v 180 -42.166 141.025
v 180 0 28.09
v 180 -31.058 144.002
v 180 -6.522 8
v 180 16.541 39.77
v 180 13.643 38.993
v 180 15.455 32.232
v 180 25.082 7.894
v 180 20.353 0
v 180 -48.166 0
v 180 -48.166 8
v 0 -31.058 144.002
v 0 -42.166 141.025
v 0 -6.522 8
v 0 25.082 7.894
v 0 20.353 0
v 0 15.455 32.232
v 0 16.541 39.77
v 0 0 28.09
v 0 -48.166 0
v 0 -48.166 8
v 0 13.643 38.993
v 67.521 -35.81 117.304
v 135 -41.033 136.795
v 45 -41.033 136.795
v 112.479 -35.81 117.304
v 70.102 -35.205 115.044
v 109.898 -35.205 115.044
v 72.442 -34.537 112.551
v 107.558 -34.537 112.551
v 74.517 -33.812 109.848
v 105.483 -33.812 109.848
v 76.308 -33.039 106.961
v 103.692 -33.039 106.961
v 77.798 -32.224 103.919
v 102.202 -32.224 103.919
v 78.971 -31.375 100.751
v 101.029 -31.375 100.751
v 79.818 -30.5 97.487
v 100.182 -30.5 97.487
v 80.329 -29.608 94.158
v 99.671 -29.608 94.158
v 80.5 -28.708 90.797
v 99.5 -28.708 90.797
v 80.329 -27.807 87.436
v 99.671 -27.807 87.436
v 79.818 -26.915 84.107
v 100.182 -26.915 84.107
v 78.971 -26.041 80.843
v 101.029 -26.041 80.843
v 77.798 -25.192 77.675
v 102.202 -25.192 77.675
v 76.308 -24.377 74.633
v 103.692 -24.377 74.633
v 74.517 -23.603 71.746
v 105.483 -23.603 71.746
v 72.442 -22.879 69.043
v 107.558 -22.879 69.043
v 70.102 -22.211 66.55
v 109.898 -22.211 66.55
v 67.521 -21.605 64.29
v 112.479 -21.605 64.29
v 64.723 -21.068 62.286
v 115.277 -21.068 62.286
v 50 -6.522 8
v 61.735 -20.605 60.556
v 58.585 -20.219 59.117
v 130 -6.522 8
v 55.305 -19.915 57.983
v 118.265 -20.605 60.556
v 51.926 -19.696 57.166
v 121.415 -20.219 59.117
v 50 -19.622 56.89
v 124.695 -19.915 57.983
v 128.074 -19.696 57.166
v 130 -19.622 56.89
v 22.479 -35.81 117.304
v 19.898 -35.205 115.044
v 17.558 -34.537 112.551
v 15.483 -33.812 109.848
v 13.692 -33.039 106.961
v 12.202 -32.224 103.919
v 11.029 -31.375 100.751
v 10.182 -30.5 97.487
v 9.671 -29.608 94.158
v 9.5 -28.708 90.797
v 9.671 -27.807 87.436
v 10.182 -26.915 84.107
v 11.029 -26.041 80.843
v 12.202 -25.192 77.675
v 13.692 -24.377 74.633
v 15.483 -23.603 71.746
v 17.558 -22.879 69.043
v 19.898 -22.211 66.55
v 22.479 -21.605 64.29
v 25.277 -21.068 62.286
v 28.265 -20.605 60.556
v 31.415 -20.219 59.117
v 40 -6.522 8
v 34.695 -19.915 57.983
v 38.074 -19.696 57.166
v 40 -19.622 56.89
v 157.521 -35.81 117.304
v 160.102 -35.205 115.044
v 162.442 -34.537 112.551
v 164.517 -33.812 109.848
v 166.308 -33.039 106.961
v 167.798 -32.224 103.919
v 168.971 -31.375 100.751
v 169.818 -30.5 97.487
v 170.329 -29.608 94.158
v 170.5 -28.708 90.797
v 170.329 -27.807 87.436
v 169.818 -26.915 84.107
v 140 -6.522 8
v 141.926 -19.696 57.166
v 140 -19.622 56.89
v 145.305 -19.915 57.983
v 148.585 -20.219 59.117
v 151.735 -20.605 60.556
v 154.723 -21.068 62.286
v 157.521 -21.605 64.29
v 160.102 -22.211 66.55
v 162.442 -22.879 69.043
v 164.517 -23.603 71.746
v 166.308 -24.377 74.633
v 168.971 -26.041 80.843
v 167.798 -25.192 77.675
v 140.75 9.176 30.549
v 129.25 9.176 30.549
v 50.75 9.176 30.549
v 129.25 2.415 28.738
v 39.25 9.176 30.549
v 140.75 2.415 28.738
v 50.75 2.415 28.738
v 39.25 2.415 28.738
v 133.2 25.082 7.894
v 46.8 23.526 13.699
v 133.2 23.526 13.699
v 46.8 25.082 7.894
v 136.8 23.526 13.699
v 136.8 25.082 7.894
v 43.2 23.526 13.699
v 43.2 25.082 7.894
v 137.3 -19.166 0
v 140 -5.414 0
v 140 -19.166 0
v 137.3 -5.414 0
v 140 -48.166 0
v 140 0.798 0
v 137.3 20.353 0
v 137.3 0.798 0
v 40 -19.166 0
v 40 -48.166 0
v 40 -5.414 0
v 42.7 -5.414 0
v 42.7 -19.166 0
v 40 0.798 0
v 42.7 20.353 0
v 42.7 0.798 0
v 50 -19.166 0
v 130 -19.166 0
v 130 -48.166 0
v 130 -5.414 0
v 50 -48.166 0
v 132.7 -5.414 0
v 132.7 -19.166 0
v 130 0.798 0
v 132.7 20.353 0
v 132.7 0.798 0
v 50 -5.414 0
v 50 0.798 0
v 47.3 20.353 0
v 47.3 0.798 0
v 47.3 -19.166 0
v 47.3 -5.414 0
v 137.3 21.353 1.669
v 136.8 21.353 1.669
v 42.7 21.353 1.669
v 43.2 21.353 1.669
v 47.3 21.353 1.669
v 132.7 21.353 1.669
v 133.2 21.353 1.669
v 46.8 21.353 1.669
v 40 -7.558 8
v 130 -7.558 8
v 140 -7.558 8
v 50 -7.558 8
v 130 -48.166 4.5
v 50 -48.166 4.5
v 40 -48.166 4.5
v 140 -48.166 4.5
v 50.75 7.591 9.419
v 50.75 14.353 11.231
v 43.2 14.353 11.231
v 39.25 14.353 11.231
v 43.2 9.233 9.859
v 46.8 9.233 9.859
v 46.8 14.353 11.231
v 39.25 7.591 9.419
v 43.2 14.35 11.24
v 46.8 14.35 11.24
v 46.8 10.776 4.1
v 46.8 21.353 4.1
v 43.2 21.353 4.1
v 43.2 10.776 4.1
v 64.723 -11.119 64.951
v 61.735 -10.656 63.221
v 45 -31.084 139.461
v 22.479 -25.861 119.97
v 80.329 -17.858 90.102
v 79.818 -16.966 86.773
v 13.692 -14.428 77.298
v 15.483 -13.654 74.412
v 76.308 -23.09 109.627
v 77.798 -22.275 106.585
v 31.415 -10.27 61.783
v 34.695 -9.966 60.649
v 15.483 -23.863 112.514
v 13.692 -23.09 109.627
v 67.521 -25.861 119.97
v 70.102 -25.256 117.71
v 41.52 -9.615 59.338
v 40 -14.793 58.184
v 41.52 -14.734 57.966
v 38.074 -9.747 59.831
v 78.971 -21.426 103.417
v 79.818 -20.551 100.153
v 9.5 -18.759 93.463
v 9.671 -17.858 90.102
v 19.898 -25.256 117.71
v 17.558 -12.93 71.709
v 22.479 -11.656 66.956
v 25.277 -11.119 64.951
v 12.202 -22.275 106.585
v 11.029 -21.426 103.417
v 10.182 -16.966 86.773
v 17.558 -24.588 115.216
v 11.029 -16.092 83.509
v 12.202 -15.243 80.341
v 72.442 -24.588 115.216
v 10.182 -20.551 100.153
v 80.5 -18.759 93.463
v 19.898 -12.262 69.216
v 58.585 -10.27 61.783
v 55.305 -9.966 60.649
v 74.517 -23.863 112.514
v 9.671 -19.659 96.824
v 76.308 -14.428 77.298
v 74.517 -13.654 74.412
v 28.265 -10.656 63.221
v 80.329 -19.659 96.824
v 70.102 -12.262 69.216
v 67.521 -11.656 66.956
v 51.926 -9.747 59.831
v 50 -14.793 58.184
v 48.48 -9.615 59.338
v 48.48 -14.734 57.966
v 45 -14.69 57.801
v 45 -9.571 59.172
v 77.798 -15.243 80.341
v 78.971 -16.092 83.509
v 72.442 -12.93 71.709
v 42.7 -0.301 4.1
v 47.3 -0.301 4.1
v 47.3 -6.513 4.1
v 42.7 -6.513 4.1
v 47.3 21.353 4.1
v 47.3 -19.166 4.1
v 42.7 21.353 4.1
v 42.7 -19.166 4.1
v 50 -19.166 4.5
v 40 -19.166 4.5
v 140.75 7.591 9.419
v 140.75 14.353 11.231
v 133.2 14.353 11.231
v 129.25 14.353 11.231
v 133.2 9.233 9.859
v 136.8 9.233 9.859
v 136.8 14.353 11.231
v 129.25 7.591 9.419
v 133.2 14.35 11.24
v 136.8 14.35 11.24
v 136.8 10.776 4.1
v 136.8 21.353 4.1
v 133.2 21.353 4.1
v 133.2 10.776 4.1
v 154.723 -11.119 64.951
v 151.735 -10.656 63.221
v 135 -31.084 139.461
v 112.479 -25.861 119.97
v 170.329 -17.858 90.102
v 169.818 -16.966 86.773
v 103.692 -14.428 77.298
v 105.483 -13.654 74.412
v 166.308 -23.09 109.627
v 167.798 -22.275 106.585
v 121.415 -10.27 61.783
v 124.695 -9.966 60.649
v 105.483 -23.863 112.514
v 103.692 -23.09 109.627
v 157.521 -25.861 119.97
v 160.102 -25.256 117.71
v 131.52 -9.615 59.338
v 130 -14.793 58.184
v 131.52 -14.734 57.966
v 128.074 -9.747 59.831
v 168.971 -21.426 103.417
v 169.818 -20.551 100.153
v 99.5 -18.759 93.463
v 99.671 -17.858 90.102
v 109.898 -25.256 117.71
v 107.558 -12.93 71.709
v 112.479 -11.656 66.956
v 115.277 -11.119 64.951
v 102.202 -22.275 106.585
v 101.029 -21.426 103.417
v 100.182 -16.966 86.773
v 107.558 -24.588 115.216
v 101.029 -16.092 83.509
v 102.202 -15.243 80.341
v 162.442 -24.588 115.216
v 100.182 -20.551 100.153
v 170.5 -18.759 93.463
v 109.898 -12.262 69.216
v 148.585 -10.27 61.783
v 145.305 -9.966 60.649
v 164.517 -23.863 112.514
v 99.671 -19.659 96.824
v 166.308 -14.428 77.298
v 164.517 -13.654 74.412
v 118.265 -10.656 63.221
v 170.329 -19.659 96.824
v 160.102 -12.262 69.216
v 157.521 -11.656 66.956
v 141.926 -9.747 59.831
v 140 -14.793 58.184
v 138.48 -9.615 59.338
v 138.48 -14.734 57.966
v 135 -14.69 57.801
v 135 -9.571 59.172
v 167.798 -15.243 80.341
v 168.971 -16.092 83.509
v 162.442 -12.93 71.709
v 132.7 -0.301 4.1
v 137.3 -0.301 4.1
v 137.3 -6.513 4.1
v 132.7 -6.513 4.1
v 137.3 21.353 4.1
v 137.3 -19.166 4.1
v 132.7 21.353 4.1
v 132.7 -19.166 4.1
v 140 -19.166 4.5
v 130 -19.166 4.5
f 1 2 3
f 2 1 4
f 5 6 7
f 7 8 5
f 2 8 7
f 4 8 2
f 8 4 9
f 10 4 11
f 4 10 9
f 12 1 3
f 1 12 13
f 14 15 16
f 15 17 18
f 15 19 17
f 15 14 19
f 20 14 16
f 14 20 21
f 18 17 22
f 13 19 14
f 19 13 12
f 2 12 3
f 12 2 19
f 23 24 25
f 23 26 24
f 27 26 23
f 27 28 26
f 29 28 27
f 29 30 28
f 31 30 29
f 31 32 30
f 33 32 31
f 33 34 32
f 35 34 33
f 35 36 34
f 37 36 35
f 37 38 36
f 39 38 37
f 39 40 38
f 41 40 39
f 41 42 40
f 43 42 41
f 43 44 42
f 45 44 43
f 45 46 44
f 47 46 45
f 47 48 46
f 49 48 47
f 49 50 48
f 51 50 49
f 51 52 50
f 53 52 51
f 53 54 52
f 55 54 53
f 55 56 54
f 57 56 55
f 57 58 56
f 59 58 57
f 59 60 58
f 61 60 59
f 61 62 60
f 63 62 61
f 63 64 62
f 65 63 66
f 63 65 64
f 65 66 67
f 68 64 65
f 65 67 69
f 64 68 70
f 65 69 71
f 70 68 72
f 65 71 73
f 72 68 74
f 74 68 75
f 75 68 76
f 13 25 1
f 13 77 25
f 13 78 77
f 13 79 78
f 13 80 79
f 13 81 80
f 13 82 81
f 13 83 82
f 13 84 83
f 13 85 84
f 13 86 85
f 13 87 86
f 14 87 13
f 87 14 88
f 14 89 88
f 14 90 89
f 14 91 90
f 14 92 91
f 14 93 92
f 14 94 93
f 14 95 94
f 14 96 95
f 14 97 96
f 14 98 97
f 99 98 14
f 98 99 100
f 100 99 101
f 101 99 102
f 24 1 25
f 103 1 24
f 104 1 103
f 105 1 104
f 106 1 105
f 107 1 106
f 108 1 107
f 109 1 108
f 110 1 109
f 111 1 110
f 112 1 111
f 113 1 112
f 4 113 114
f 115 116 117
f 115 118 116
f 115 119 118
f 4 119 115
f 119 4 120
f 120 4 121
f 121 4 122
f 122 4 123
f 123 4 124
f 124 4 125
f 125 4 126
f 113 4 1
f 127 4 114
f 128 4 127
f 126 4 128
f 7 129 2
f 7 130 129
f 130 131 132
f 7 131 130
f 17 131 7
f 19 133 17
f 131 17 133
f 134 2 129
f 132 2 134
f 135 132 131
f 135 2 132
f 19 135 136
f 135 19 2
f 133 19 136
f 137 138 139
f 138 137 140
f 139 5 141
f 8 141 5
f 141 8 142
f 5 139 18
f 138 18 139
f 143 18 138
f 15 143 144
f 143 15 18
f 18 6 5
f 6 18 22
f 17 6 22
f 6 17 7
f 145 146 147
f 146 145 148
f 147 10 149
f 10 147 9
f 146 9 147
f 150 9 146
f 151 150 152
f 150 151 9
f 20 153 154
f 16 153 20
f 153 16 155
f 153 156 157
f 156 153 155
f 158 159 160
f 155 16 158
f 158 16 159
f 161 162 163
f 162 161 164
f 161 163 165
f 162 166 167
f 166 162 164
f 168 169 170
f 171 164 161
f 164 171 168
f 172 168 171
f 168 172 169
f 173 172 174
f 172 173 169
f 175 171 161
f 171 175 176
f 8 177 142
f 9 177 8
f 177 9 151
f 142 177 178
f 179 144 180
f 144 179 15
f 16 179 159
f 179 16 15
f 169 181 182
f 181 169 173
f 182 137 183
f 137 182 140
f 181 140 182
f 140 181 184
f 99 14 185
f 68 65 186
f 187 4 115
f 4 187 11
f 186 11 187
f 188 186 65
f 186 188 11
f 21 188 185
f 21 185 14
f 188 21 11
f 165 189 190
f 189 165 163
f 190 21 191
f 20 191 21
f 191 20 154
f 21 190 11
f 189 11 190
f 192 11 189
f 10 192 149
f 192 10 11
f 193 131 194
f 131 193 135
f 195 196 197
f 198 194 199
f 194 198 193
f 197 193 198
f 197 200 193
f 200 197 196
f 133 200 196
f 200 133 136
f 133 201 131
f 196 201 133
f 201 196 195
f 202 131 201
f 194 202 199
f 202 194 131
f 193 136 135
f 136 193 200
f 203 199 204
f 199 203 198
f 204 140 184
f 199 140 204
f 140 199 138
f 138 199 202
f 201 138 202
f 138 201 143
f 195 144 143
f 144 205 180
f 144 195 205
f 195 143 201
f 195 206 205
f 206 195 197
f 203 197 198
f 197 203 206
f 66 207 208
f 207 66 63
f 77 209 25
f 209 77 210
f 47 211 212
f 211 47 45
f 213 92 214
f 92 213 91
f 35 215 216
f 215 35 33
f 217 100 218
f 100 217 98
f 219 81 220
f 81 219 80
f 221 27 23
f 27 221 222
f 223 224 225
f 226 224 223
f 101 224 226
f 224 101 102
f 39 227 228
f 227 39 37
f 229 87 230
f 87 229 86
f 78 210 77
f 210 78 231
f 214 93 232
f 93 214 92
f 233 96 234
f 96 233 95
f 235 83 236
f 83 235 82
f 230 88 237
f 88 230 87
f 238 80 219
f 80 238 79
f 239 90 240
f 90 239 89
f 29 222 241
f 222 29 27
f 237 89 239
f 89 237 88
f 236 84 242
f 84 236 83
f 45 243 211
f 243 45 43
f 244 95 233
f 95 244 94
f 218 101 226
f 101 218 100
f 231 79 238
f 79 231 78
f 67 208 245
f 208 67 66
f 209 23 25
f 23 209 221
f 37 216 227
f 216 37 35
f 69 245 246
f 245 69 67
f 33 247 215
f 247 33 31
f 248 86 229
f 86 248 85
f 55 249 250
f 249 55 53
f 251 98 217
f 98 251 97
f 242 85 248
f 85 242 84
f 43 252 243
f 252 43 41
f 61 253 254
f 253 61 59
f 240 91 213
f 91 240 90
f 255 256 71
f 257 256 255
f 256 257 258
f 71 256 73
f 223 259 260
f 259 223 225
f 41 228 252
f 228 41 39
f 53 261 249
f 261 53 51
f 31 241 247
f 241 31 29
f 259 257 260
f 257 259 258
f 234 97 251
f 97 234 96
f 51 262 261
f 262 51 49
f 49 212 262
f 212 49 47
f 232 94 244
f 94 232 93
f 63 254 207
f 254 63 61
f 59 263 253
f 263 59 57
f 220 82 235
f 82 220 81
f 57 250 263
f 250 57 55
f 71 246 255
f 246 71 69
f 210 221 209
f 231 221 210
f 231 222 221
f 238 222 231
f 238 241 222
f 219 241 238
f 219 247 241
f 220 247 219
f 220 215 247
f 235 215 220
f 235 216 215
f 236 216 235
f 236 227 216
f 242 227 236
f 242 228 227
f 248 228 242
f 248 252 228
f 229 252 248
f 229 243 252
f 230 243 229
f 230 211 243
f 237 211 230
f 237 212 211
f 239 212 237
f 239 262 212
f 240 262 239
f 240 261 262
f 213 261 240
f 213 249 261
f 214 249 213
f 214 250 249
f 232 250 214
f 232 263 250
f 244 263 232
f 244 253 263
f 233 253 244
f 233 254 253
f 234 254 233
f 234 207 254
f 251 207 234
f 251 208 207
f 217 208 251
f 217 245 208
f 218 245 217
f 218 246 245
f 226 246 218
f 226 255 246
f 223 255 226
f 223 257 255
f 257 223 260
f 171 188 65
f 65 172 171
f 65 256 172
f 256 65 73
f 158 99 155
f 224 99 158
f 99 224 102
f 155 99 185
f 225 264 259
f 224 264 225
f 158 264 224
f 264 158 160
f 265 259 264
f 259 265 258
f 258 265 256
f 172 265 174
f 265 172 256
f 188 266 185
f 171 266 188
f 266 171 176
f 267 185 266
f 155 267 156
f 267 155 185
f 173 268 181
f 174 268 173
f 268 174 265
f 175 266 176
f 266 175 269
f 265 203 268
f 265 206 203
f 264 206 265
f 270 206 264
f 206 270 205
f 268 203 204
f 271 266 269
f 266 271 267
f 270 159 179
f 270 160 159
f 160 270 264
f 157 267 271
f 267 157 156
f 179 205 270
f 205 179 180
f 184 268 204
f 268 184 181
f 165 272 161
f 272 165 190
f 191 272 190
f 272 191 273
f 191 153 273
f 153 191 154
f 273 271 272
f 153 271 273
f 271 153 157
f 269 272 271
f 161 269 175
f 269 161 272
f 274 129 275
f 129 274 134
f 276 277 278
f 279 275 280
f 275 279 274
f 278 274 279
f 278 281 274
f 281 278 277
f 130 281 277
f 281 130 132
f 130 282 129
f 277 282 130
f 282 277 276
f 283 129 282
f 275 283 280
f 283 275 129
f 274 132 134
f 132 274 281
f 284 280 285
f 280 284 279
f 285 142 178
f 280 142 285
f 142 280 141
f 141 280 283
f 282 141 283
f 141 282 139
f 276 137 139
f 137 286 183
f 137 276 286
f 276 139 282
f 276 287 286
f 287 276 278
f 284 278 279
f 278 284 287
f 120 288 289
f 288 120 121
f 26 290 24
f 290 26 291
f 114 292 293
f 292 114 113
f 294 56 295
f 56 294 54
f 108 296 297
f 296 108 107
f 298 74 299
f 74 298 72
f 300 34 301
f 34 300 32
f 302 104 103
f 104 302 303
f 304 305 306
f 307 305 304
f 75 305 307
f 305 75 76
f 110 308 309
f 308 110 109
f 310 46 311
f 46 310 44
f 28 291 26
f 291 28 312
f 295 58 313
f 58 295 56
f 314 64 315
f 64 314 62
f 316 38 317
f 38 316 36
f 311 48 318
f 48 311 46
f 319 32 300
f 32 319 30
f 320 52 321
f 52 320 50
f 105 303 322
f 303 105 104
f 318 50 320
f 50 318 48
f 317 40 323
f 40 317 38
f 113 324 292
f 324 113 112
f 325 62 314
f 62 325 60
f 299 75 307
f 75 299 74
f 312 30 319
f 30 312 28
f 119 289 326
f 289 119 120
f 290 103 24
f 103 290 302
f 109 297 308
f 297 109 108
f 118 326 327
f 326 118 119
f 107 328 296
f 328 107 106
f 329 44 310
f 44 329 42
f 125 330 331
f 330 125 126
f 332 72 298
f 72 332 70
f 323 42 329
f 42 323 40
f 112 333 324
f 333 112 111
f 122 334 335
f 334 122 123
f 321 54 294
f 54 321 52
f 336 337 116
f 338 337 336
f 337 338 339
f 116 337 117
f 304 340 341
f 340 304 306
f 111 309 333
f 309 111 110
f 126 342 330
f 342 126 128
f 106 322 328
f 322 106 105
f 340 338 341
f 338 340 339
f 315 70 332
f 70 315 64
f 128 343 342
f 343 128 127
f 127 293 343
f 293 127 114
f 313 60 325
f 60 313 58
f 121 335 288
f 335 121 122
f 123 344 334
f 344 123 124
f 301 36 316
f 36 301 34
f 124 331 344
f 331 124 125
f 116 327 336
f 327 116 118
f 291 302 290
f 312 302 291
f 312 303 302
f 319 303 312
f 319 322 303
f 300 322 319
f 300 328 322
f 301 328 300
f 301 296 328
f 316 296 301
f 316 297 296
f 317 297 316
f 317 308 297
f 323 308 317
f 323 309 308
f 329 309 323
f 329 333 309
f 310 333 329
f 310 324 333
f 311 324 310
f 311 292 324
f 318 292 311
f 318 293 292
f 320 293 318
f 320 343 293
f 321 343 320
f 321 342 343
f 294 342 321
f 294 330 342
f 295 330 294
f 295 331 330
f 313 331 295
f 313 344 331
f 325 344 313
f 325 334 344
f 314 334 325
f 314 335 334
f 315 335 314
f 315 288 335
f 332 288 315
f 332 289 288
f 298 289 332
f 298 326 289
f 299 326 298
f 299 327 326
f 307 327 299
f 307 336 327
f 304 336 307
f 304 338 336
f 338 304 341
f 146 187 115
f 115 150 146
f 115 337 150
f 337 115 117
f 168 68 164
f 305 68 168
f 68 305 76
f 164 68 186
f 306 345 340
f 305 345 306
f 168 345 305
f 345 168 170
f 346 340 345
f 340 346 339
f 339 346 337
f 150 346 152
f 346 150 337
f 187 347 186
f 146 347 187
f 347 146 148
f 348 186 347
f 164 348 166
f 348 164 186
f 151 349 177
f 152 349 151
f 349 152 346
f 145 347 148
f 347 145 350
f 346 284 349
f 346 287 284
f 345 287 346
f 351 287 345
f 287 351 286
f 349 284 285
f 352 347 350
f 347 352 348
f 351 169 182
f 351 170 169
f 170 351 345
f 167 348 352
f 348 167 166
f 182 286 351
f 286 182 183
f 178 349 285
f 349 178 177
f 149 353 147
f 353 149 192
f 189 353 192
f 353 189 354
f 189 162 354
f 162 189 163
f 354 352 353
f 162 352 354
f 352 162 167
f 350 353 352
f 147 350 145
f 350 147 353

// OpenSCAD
// Phone dock, N bays. Each bay does all three:
//  1 cable keeper: the USB-C plug parks in a pocket in the ledge, cable can't fall.
//  2 drop-on dock: plug sits tip-up in that pocket, the phone drops onto it.
//  3 wireless: a pocket behind the backrest takes a round Qi pad (add later).
// Any phone/case: wide bays, deep ledge, plug height set with shims (part="shim").
// part = "dock" | "shim"
part = "dock";

bays   = 2;
bay_w  = 90;       // fits phones up to ~85 mm wide with case
a      = 15;       // lean-back angle
H      = 120;      // backrest height above the ledge
bt     = 11.5;     // backrest thickness (holds the Qi pad)
ledge_h = 26;      // ledge depth below the phone (holds the plug)
ledge_d = 16;      // phone + case thickness room
lip_t  = 3;  lip_h = 7;

// USB-C plug (MEASURE with caliper: boot width, thickness, length w/o metal)
boot_w = 11.5;  boot_t = 7;  boot_len = 20;
cable_w = 3.6;  // slit: a bit under the cable so it snaps in
port_off = 6;   // port centre from the phone's back face (phone/2 + case)

// Qi pad (MEASURE): round, diameter / thickness
pad_d = 71;  pad_t = 9;  pad_u = 68;  skin = 1.2;

$fn = 64;
W  = bays * bay_w;
z0 = ledge_h * cos(a) + bt * sin(a);
back_y = -(H * sin(a) + bt * cos(a)) - 6;   // foot reaches behind the top: no tipping
front_y = (ledge_d + lip_t) * cos(a) + 2;

module frame() translate([0, 0, z0]) rotate([a, 0, 0]) children();

module body() {
  intersection() {
    union() {
      frame() {
        translate([0, -bt, -ledge_h]) cube([W, bt, ledge_h + H]);             // backrest
        translate([0, 0, -ledge_h]) cube([W, ledge_d + lip_t, ledge_h]);      // ledge
        translate([0, ledge_d, 0]) cube([W, lip_t, lip_h]);                    // lip
      }
      // fill under the ledge down to the bed
      hull() {
        frame() translate([0, 0, -ledge_h]) cube([W, ledge_d + lip_t, 1]);
        translate([0, 0, 0]) cube([W, front_y, 1]);
      }
      translate([0, back_y, 0]) cube([W, front_y - back_y, 8]);               // foot (8: grooves under it)
    }
    translate([-1, -500, 0]) cube([W + 2, 1000, 500]);
  }
}

module bay_cuts(cx) {
  frame() {
    // plug pocket, top flush with the ledge
    translate([cx - boot_w / 2, port_off - boot_t / 2, -boot_len]) cube([boot_w, boot_t, boot_len + 1]);
    // cable channel down from the pocket, and a front slit to press the cable in
    translate([cx - cable_w / 2, port_off - cable_w / 2, -ledge_h - 60]) cube([cable_w, ledge_d + lip_t + 10, ledge_h + 60 - boot_len + 0.01]);
    // Qi pad pocket from the back, teardrop top (prints without support)
    translate([cx, -skin, pad_u]) rotate([90, 0, 0]) linear_extrude(bt) hull() {
      circle(d = pad_d);
      translate([0, pad_d / 2 * 1.2]) rotate(45) square(pad_d / 2 * 0.2, center = true);
    }
    // pad cable groove down the back
    translate([cx - 5, -bt - 1, -ledge_h - 60]) cube([10, 6, pad_u + 60]);
  }
  // groove under the foot: both cables run out the back
  translate([cx - (cable_w + 1) / 2, back_y - 1, -1]) cube([cable_w + 1, front_y - back_y + 2, cable_w + 1.5]);
  translate([cx - 5, back_y - 1, -1]) cube([10, 30, 5.5]);
}

module dock() difference() {
  body();
  for (i = [0 : bays - 1]) bay_cuts(bay_w / 2 + i * bay_w);
}

// shims: drop under the plug to raise it for thick cases (1, 2, 3 mm)
module shims() for (i = [0 : 2])
  translate([i * (boot_w + 4), 0, 0]) difference() {
    cube([boot_w - 0.4, boot_t - 0.4, i + 1]);
    translate([(boot_w - 0.4 - cable_w) / 2, -1, -1]) cube([cable_w, boot_t / 2 + 1, 5]);
  }

if (part == "dock") dock(); else shims();
